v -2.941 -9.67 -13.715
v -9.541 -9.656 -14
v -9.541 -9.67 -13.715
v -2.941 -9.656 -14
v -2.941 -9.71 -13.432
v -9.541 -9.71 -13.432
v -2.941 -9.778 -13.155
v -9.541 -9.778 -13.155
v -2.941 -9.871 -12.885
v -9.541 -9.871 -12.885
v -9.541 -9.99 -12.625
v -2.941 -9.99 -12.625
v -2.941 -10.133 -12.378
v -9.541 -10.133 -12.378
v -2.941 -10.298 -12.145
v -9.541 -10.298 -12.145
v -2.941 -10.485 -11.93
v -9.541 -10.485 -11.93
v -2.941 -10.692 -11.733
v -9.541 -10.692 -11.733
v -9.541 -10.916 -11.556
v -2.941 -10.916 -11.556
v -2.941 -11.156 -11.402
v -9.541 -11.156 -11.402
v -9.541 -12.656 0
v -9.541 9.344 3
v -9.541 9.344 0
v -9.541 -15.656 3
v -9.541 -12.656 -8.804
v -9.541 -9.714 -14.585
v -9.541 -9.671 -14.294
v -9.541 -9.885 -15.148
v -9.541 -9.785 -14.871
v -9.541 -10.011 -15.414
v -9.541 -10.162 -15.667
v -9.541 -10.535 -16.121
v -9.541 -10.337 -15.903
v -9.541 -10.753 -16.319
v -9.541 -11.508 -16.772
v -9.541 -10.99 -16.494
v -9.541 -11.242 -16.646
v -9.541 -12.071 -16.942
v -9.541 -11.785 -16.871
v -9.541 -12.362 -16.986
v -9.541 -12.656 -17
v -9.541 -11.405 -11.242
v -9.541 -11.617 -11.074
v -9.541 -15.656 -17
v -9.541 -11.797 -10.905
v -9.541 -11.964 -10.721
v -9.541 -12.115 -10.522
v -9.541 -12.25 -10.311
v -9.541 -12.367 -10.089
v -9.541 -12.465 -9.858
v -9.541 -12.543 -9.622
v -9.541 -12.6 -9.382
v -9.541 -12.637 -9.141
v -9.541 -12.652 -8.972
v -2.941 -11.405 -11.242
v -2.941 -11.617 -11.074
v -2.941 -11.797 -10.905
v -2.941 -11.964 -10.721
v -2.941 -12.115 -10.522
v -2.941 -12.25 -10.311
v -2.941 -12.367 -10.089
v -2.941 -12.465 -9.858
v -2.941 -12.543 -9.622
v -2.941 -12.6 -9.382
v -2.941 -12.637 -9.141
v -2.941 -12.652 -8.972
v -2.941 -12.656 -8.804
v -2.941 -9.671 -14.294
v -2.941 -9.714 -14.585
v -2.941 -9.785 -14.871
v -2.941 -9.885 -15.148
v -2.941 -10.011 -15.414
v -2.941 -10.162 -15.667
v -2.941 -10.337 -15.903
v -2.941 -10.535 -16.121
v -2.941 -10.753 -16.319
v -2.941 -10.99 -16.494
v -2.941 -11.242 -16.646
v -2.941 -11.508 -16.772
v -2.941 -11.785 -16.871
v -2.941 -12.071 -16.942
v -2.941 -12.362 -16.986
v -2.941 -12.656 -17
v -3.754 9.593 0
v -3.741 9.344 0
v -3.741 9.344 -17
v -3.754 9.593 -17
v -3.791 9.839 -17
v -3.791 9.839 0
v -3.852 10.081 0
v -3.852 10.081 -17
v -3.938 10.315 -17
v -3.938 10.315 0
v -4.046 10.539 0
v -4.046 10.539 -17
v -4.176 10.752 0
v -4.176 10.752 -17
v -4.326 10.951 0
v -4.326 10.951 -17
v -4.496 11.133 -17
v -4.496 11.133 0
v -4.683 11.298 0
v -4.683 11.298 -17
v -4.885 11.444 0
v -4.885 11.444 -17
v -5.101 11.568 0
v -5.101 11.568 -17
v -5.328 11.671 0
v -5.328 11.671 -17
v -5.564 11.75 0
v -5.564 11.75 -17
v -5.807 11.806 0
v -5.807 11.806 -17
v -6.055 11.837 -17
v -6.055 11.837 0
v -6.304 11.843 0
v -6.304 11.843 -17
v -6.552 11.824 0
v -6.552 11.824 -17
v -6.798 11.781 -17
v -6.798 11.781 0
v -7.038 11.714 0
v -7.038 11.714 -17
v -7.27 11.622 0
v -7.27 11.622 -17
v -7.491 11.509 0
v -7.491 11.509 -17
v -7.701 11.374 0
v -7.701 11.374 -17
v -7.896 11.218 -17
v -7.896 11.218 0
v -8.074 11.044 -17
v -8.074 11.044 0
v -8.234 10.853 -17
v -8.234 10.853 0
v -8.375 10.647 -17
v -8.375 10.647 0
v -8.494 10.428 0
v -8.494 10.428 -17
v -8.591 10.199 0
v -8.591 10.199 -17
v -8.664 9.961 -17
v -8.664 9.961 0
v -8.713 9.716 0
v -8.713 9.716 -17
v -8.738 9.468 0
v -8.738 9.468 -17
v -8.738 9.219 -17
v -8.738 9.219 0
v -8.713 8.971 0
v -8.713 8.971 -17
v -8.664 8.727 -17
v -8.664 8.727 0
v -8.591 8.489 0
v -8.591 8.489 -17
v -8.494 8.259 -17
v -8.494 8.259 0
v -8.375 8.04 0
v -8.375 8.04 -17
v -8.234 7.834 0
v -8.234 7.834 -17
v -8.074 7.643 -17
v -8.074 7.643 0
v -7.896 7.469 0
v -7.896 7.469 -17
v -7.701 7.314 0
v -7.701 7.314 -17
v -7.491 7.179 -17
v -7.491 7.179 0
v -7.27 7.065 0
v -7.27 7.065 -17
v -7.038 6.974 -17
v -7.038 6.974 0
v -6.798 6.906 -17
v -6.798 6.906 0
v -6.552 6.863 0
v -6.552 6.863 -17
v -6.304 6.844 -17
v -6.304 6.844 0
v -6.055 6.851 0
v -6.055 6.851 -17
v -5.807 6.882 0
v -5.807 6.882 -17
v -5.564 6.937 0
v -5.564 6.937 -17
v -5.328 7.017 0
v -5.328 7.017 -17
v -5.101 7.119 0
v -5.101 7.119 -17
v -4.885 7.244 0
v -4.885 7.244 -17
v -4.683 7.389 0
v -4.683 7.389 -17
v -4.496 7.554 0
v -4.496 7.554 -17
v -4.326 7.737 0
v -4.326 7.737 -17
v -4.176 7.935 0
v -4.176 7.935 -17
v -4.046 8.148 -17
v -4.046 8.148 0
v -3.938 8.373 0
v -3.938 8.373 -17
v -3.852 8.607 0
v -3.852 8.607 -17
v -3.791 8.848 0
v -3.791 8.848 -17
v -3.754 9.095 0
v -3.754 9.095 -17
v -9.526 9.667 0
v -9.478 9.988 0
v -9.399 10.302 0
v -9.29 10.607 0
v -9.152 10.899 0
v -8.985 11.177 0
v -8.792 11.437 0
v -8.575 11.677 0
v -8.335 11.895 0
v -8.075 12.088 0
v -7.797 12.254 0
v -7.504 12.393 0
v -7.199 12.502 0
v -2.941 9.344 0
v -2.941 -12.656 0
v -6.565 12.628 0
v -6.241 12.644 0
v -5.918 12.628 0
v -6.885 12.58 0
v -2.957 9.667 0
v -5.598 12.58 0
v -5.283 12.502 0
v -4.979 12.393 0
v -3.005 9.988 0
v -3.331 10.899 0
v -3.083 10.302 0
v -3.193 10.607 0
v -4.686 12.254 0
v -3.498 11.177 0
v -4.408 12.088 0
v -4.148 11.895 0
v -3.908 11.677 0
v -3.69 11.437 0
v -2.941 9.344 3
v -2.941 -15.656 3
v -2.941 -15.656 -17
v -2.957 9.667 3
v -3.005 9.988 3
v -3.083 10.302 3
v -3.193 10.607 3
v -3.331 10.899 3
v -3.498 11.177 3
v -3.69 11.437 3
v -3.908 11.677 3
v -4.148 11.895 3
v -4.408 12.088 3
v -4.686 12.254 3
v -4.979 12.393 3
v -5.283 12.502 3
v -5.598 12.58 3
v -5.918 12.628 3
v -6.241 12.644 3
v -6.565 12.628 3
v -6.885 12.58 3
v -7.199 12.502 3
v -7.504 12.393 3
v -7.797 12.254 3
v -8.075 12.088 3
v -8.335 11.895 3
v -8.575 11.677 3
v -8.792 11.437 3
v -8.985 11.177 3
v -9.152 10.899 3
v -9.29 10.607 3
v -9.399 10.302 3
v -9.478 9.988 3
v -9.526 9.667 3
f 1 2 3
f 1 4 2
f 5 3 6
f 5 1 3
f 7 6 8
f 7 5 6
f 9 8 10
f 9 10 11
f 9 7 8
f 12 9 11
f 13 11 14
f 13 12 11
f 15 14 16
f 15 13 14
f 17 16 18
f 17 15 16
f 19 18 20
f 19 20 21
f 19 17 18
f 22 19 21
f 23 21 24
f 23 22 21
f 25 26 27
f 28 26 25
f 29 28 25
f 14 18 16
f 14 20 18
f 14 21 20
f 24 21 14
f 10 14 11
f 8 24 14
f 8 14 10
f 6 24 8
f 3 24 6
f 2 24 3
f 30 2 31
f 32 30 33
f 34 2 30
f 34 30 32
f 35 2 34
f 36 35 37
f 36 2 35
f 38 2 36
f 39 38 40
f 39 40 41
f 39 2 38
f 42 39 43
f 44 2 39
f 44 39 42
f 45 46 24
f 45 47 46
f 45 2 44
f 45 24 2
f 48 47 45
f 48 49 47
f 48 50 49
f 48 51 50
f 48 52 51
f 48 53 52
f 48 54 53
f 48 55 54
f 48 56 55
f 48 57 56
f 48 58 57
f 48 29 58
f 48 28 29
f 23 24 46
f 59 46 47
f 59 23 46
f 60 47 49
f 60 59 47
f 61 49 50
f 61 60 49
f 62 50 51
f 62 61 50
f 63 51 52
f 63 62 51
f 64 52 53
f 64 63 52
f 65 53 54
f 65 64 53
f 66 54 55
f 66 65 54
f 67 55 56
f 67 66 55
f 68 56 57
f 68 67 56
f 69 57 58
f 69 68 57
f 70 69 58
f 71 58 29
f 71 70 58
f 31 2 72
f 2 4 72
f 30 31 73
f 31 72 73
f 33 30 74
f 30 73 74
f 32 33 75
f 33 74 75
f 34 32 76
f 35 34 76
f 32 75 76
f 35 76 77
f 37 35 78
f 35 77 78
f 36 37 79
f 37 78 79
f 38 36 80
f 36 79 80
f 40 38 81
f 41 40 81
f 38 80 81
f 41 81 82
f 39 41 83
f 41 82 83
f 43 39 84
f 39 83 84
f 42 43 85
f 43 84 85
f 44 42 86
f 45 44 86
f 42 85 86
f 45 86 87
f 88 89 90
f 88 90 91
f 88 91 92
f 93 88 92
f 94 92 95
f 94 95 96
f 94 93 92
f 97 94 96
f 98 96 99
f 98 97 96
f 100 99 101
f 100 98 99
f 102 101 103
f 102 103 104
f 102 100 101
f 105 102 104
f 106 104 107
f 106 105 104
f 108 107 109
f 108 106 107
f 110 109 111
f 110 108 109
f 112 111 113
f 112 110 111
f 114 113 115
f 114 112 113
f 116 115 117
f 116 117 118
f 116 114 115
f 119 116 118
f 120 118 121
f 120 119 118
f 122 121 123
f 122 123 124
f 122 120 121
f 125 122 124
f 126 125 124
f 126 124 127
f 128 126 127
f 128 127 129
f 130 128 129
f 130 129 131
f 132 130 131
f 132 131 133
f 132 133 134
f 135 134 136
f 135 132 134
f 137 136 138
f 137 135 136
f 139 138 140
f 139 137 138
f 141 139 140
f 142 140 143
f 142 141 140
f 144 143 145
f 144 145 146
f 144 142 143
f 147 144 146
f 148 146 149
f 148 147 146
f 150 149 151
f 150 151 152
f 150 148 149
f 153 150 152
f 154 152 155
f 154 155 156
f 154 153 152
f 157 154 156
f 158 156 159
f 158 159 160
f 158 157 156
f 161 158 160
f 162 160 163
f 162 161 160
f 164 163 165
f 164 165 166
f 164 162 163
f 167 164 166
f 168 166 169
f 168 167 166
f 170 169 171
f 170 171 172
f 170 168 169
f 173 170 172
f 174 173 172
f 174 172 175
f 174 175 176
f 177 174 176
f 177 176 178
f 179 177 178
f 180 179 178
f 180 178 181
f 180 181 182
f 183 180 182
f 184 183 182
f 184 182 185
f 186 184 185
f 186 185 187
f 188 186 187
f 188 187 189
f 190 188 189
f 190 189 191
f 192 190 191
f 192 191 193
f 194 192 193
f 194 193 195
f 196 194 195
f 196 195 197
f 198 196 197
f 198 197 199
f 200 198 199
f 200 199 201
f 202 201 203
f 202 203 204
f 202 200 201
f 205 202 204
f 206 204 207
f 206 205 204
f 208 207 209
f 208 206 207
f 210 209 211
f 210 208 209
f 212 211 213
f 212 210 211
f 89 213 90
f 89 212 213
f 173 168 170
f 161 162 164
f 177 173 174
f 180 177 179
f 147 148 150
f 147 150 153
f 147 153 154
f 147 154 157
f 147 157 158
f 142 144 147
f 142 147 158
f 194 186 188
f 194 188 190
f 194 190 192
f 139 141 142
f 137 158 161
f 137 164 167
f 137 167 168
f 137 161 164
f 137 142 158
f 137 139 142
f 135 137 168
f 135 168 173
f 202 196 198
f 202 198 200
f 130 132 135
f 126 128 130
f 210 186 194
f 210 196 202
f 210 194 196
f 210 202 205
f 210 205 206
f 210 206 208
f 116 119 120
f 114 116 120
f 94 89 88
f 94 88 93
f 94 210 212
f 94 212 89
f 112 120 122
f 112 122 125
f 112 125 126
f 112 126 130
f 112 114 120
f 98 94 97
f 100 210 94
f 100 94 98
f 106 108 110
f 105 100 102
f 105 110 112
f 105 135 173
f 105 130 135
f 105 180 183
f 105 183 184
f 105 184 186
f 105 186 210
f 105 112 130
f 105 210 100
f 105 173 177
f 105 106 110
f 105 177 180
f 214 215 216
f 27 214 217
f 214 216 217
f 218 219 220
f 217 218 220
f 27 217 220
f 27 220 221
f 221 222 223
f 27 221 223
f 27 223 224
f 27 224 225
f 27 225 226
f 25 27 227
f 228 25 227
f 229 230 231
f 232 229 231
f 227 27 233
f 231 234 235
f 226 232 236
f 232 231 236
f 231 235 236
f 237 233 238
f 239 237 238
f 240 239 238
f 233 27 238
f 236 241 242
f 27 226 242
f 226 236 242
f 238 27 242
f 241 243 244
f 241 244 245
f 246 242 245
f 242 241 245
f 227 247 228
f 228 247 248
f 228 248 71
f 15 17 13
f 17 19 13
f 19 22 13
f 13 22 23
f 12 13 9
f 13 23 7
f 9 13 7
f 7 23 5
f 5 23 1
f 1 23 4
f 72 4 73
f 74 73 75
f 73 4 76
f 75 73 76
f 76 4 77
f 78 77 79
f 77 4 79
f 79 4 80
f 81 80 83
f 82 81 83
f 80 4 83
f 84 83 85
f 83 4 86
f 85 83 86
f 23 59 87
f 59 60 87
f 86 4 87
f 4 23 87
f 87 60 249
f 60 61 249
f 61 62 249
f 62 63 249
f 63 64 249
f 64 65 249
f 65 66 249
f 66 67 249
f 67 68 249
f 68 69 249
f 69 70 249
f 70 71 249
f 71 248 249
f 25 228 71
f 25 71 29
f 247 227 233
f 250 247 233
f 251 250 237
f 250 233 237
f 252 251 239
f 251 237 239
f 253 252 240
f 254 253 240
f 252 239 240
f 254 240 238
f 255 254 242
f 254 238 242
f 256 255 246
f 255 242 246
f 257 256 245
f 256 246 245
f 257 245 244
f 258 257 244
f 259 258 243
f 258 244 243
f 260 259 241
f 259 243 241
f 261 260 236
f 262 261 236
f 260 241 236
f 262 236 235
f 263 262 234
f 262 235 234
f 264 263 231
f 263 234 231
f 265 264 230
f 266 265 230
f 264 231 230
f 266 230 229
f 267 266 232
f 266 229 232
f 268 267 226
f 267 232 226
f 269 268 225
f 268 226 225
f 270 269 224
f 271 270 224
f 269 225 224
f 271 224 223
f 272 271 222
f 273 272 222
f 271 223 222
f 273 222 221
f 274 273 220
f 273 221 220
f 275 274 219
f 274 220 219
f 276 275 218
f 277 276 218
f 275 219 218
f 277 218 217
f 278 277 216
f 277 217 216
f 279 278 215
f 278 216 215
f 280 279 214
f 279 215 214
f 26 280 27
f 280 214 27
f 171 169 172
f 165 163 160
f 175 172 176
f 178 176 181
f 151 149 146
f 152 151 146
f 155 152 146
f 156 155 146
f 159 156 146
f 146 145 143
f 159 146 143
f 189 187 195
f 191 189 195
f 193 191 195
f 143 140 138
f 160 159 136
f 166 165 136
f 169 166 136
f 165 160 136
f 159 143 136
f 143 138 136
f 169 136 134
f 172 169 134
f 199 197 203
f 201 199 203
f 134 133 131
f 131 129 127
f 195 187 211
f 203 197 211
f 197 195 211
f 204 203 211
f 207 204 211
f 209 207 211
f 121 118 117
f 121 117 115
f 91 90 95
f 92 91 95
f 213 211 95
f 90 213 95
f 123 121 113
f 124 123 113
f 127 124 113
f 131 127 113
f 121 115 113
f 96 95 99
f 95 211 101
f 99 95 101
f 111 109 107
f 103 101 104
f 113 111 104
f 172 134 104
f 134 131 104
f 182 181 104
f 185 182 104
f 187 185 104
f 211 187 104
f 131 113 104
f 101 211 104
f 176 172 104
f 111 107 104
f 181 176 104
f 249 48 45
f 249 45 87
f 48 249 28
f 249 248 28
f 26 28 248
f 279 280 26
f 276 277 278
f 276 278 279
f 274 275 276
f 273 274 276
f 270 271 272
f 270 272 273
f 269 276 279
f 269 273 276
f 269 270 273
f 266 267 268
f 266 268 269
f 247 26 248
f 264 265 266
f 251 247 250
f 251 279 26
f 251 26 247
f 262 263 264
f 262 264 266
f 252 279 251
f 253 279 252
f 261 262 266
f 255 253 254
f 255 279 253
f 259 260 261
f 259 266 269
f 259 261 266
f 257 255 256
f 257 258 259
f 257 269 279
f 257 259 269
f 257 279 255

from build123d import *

# Parameters (mm, degrees)
SKETCH1_R           = 2.5
BOSS_EXTRUDE1_DEPTH = 17
SKETCH2_R           = 2.5
BOSS_EXTRUDE2_DEPTH = 3
SKETCH3_W           = 6.6
SKETCH3_H           = 3
BOSS_EXTRUDE3_DEPTH = 17
SKETCH4_W           = 6.6
SKETCH4_H           = 6
BOSS_EXTRUDE4_DEPTH = 3
FILLET1_R           = 3
FILLET2_R           = 3
FILLET3_R           = 3


with BuildPart() as part:
    # Sketch1 → Boss-Extrude1 (new body)
    with BuildSketch(Plane.XY):
        with Locations((-6.241397348, 9.343721229)):
            Circle(SKETCH1_R)
    extrude(amount=-BOSS_EXTRUDE1_DEPTH)


with BuildPart() as body_2:
    # Sketch2 → Boss-Extrude2 (new body)
    with BuildSketch(Plane.XY):
        with BuildLine():
            ThreePointArc((-8.741397348, 9.343721229), (-6.241397348, 11.843721229), (-3.741397348, 9.343721229))
            Line((-3.741397348, 9.343721229), (-2.941397348, 9.343721229))
            ThreePointArc((-2.941397348, 9.343721229), (-6.241397348, 12.643721229), (-9.541397348, 9.343721229))
            Line((-9.541397348, 9.343721229), (-8.741397348, 9.343721229))
        make_face()
        with BuildLine():
            Line((-2.941397348, 9.343721229), (-3.741397348, 9.343721229))
            ThreePointArc((-3.741397348, 9.343721229), (-6.241397348, 6.843721229), (-8.741397348, 9.343721229))
            Line((-8.741397348, 9.343721229), (-9.541397348, 9.343721229))
            ThreePointArc((-9.541397348, 9.343721229), (-6.241397348, 6.043721229), (-2.941397348, 9.343721229))
        make_face()
        with BuildLine():
            Line((-2.941397348, -15.656278771), (-2.941397348, 9.343721229))
            ThreePointArc((-2.941397348, 9.343721229), (-6.241397348, 6.043721229), (-9.541397348, 9.343721229))
            Line((-9.541397348, 9.343721229), (-9.541397348, -15.656278771))
            Line((-9.541397348, -15.656278771), (-2.941397348, -15.656278771))
        make_face()
        with Locations((-6.241397348, 9.343721229)):
            Circle(SKETCH2_R)
    extrude(amount=BOSS_EXTRUDE2_DEPTH)

    # Sketch3 → Boss-Extrude3 (add)
    with BuildSketch(Plane(origin=(0, 0, 0), x_dir=(-1, 0, 0), z_dir=(0, 0, -1))):
        with Locations((6.241397348, -14.156278771)):
            Rectangle(SKETCH3_W, SKETCH3_H)
    extrude(amount=BOSS_EXTRUDE3_DEPTH)

    # Sketch4 → Boss-Extrude4 (add)
    with BuildSketch(Plane(origin=(0, -12.656278771, 0), x_dir=(1, 0, 0), z_dir=(0, 1, 0))):
        with Locations((-6.241397348, 14)):
            Rectangle(SKETCH4_W, SKETCH4_H)
    extrude(amount=BOSS_EXTRUDE4_DEPTH)

    # Fillet1
    fillet1_edges = [body_2.edges().sort_by_distance(p)[0] for p in [
        (-6.241397348, -9.656278771, -11),
    ]]
    fillet(fillet1_edges, radius=FILLET1_R - 0.0001)  # a hair under: the kernel refuses the full size

    # Fillet2
    fillet2_edges = [body_2.edges().sort_by_distance(p)[0] for p in [
        (-6.241397348, -12.656278771, -11),
    ]]
    fillet(fillet2_edges, radius=FILLET2_R)

    # Fillet3
    fillet3_edges = [body_2.edges().sort_by_distance(p)[0] for p in [
        (-6.241397348, -9.656278771, -17),
    ]]
    fillet(fillet3_edges, radius=FILLET3_R)


solid = Compound([part.part, body_2.part])
